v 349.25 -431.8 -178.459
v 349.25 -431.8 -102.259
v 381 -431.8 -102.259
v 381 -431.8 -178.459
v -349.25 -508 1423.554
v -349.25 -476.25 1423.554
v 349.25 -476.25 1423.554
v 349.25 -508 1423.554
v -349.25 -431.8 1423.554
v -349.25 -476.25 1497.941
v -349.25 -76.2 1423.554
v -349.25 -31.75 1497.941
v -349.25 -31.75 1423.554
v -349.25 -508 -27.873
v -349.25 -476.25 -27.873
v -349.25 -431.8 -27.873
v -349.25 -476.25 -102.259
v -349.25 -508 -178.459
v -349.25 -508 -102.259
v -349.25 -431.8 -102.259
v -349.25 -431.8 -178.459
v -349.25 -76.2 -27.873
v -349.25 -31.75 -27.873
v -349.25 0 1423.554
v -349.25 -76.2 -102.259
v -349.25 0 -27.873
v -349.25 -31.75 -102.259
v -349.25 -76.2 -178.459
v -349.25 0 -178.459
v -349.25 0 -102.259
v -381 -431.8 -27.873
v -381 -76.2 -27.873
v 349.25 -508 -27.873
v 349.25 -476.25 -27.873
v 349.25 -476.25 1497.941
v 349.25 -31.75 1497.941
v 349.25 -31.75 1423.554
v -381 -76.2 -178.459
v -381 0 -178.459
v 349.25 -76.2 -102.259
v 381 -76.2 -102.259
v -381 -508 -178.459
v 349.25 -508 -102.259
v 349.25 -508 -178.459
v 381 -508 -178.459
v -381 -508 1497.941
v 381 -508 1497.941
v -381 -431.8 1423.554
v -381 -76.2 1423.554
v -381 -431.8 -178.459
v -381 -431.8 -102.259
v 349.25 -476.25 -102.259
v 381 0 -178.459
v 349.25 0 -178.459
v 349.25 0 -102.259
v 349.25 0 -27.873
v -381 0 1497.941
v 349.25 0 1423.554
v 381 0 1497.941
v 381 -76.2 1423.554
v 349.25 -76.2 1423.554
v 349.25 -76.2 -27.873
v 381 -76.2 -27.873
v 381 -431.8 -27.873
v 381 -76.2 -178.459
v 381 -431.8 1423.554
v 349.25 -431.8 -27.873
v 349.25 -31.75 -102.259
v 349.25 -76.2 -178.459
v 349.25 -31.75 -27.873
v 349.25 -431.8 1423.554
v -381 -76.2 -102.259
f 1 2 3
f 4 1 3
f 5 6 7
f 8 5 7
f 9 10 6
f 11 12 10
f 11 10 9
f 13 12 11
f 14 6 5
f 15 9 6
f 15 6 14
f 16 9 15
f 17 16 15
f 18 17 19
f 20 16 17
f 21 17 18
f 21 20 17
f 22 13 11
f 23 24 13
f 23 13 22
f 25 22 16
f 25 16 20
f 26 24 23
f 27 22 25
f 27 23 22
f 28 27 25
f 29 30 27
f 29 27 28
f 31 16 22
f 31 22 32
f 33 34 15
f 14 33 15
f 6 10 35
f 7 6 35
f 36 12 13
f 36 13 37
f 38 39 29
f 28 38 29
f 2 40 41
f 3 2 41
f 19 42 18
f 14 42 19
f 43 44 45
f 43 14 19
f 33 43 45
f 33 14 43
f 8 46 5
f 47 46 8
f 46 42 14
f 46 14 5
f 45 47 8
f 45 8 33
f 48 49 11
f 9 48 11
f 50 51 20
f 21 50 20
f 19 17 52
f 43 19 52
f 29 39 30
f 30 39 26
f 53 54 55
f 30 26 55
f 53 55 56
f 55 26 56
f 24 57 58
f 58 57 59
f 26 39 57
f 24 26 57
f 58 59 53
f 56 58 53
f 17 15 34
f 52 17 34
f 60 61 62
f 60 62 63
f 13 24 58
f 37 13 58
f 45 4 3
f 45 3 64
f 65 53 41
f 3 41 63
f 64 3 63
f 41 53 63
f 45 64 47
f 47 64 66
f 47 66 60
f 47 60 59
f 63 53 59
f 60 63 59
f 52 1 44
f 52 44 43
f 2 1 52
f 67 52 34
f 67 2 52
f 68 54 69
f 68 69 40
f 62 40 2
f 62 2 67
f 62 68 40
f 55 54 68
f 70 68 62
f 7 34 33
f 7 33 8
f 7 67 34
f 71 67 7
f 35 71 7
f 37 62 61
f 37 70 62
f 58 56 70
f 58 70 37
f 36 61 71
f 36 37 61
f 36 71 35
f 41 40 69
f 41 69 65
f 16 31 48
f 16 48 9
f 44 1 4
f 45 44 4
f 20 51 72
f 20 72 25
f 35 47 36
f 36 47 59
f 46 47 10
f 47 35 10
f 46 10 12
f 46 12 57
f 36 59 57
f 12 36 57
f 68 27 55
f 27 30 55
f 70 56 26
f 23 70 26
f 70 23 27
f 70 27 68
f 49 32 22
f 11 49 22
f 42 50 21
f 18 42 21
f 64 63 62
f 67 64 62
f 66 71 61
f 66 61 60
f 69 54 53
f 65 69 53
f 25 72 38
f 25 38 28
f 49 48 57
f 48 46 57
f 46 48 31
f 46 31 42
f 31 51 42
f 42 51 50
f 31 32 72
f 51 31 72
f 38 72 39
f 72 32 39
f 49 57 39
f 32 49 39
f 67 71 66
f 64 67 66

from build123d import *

# Parameters (mm, degrees)
F0_W      = 15.875
F0_H      = 25.4
F0_H_2    = 1451.4265329467
F0_H_3    = 25.4000000258
F0_W_2    = 31.75
F0_H_4    = 76.2
F0_H_5    = 11.7933667633
F0_H_6    = 11.7933667375
F1_DEPTH  = 508
F2_START  = -76.2
F1_FACE_W = 31.75
F1_FACE_H = 1676.4
F2_DEPTH  = 355.6
F3_DEPTH  = 508
F4_DEPTH  = 508
F5_START  = 31.75
F5_DEPTH  = 444.5


with BuildPart() as f1:
    # F0 (on Front) → F1 (new body)
    with BuildSketch(Plane.XZ):
        with Locations((357.1875, 1448.0473103974)):
            Rectangle(F0_W, F0_H)
        Polygon((381, 1423.553943634), (381, 1497.9406771607), (349.25, 1497.9406771607), (349.25, 1460.7473103974), (365.125, 1460.7473103974), (365.125, 1435.3473103974), (365.125, 1423.553943634), align=None)
        with Locations((373.0625, 697.8406771607)):
            Rectangle(F0_W, F0_H_2)
        with Locations((357.1875, 697.8406771607)):
            Rectangle(F0_W, F0_H_2)
        Polygon((381, -102.2593228393), (381, -27.8725893126), (365.125, -27.8725893126), (365.125, -39.6659560502), (365.125, -65.065956076), (349.25, -65.065956076), (349.25, -102.2593228393), align=None)
        with Locations((357.1875, -52.3659560631)):
            Rectangle(F0_W, F0_H_3)
        with Locations((365.125, -140.3593228393)):
            Rectangle(F0_W_2, F0_H_4)
        with Locations((357.1875, 1429.4506270157)):
            Rectangle(F0_W, F0_H_5)
        with Locations((357.1875, -33.7692726814)):
            Rectangle(F0_W, F0_H_6)
    extrude(amount=F1_DEPTH)


with BuildPart() as f1b:
    # F0 (on Front) → F1, piece 2 (new body)
    with BuildSketch(Plane.XZ):
        with Locations((-365.125, -140.3593228393)):
            Rectangle(F0_W_2, F0_H_4)
        Polygon((-365.125, -27.8725893126), (-381, -27.8725893126), (-381, -102.2593228393), (-349.25, -102.2593228393), (-349.25, -65.065956076), (-365.125, -65.065956076), (-365.125, -39.6659560502), align=None)
        with Locations((-357.1875, -52.3659560631)):
            Rectangle(F0_W, F0_H_3)
        with Locations((-357.1875, 697.8406771607)):
            Rectangle(F0_W, F0_H_2)
        with Locations((-373.0625, 697.8406771607)):
            Rectangle(F0_W, F0_H_2)
        with Locations((-357.1875, 1448.0473103974)):
            Rectangle(F0_W, F0_H)
        Polygon((-349.25, 1460.7473103974), (-349.25, 1497.9406771607), (-381, 1497.9406771607), (-381, 1423.553943634), (-365.125, 1423.553943634), (-365.125, 1435.3473103974), (-365.125, 1460.7473103974), align=None)
        with Locations((-357.1875, 1429.4506270157)):
            Rectangle(F0_W, F0_H_5)
        with Locations((-357.1875, -33.7692726814)):
            Rectangle(F0_W, F0_H_6)
    extrude(amount=F1_DEPTH)


with BuildPart() as f2_tool:
    # F1_face (on face) → F2 (new body)
    with BuildSketch(Plane(origin=(365.125, 0, 659.7406771607), x_dir=(1, 0, 0), z_dir=(0, 1, 0)).offset(F2_START)):
        Rectangle(F1_FACE_W, F1_FACE_H)
        with Locations((-730.25, 0)):
            Rectangle(F1_FACE_W, F1_FACE_H)
    extrude(amount=-F2_DEPTH)


with BuildPart() as f1_1:
    add(f1.part)

    # F2: cut by f2_tool
    add(f2_tool.part, mode=Mode.SUBTRACT)



with BuildPart() as f1b_1:
    add(f1b.part)

    # F2: cut by f2_tool
    add(f2_tool.part, mode=Mode.SUBTRACT)


with BuildPart() as f3:
    # F0 (on Front) → F3 (new body, through all)
    with BuildSketch(Plane.XZ):
        Polygon((381, 1423.553943634), (381, 1497.9406771607), (349.25, 1497.9406771607), (349.25, 1460.7473103974), (365.125, 1460.7473103974), (365.125, 1435.3473103974), (365.125, 1423.553943634), align=None)
        with Locations((357.1875, 1429.4506270157)):
            Rectangle(F0_W, F0_H_5)
        with Locations((357.1875, 1448.0473103974)):
            Rectangle(F0_W, F0_H)
    extrude(amount=F3_DEPTH)


with BuildPart() as f3b:
    # F0 (on Front) → F3, piece 2 (new body, through all)
    with BuildSketch(Plane.XZ):
        Polygon((-349.25, 1460.7473103974), (-349.25, 1497.9406771607), (-381, 1497.9406771607), (-381, 1423.553943634), (-365.125, 1423.553943634), (-365.125, 1435.3473103974), (-365.125, 1460.7473103974), align=None)
        with Locations((-357.1875, 1448.0473103974)):
            Rectangle(F0_W, F0_H)
        with Locations((-357.1875, 1429.4506270157)):
            Rectangle(F0_W, F0_H_5)
    extrude(amount=F3_DEPTH)


with BuildPart() as f3c:
    # F0 (on Front) → F3, piece 3 (new body, through all)
    with BuildSketch(Plane.XZ):
        with Locations((357.1875, -52.3659560631)):
            Rectangle(F0_W, F0_H_3)
        Polygon((381, -102.2593228393), (381, -27.8725893126), (365.125, -27.8725893126), (365.125, -39.6659560502), (365.125, -65.065956076), (349.25, -65.065956076), (349.25, -102.2593228393), align=None)
        with Locations((357.1875, -33.7692726814)):
            Rectangle(F0_W, F0_H_6)
    extrude(amount=F3_DEPTH)


with BuildPart() as f3d:
    # F0 (on Front) → F3, piece 4 (new body, through all)
    with BuildSketch(Plane.XZ):
        with Locations((-357.1875, -52.3659560631)):
            Rectangle(F0_W, F0_H_3)
        Polygon((-365.125, -27.8725893126), (-381, -27.8725893126), (-381, -102.2593228393), (-349.25, -102.2593228393), (-349.25, -65.065956076), (-365.125, -65.065956076), (-365.125, -39.6659560502), align=None)
        with Locations((-357.1875, -33.7692726814)):
            Rectangle(F0_W, F0_H_6)
    extrude(amount=F3_DEPTH)


with BuildPart() as f1_2:
    add(f1_1.part)

    add(f1b_1.part)  # F4 merges F1b

    add(f3.part)  # F4 merges F3

    add(f3b.part)  # F4 merges F3b

    add(f3c.part)  # F4 merges F3c

    add(f3d.part)  # F4 merges F3d
    # F0 (on Front) → F4 (join)
    with BuildSketch(Plane.XZ):
        Polygon((349.25, 1460.7473103974), (349.25, 1497.9406771607), (-349.25, 1497.9406771607), (-349.25, 1460.7473103974), (0, 1460.7473103974), align=None)
        Polygon((349.25, 1423.553943634), (349.25, 1435.3473103974), (0, 1435.3473103974), (-349.25, 1435.3473103974), (-349.25, 1423.553943634), align=None)
        Polygon((349.25, -39.6659560502), (349.25, -27.8725893126), (-349.25, -27.8725893126), (-349.25, -39.6659560502), (0, -39.6659560502), align=None)
        Polygon((-349.25, -102.2593228393), (349.25, -102.2593228393), (349.25, -65.065956076), (0, -65.065956076), (-349.25, -65.065956076), align=None)
        Polygon((0, -65.065956076), (349.25, -65.065956076), (349.25, -39.6659560502), (0, -39.6659560502), (-349.25, -39.6659560502), (-349.25, -65.065956076), align=None)
        Polygon((349.25, 1435.3473103974), (349.25, 1460.7473103974), (0, 1460.7473103974), (-349.25, 1460.7473103974), (-349.25, 1435.3473103974), (0, 1435.3473103974), align=None)
    extrude(amount=F4_DEPTH)

    # F0 (on Front) → F5 (cut)
    with BuildSketch(Plane.XZ.offset(F5_START)):
        Polygon((349.25, 1423.553943634), (349.25, 1435.3473103974), (0, 1435.3473103974), (-349.25, 1435.3473103974), (-349.25, 1423.553943634), align=None)
        Polygon((349.25, 1460.7473103974), (349.25, 1497.9406771607), (-349.25, 1497.9406771607), (-349.25, 1460.7473103974), (0, 1460.7473103974), align=None)
        Polygon((349.25, -39.6659560502), (349.25, -27.8725893126), (-349.25, -27.8725893126), (-349.25, -39.6659560502), (0, -39.6659560502), align=None)
        Polygon((-349.25, -102.2593228393), (349.25, -102.2593228393), (349.25, -65.065956076), (0, -65.065956076), (-349.25, -65.065956076), align=None)
        Polygon((349.25, 1435.3473103974), (349.25, 1460.7473103974), (0, 1460.7473103974), (-349.25, 1460.7473103974), (-349.25, 1435.3473103974), (0, 1435.3473103974), align=None)
        Polygon((0, -65.065956076), (349.25, -65.065956076), (349.25, -39.6659560502), (0, -39.6659560502), (-349.25, -39.6659560502), (-349.25, -65.065956076), align=None)
    extrude(amount=F5_DEPTH, mode=Mode.SUBTRACT)


solid = f1_2.part
